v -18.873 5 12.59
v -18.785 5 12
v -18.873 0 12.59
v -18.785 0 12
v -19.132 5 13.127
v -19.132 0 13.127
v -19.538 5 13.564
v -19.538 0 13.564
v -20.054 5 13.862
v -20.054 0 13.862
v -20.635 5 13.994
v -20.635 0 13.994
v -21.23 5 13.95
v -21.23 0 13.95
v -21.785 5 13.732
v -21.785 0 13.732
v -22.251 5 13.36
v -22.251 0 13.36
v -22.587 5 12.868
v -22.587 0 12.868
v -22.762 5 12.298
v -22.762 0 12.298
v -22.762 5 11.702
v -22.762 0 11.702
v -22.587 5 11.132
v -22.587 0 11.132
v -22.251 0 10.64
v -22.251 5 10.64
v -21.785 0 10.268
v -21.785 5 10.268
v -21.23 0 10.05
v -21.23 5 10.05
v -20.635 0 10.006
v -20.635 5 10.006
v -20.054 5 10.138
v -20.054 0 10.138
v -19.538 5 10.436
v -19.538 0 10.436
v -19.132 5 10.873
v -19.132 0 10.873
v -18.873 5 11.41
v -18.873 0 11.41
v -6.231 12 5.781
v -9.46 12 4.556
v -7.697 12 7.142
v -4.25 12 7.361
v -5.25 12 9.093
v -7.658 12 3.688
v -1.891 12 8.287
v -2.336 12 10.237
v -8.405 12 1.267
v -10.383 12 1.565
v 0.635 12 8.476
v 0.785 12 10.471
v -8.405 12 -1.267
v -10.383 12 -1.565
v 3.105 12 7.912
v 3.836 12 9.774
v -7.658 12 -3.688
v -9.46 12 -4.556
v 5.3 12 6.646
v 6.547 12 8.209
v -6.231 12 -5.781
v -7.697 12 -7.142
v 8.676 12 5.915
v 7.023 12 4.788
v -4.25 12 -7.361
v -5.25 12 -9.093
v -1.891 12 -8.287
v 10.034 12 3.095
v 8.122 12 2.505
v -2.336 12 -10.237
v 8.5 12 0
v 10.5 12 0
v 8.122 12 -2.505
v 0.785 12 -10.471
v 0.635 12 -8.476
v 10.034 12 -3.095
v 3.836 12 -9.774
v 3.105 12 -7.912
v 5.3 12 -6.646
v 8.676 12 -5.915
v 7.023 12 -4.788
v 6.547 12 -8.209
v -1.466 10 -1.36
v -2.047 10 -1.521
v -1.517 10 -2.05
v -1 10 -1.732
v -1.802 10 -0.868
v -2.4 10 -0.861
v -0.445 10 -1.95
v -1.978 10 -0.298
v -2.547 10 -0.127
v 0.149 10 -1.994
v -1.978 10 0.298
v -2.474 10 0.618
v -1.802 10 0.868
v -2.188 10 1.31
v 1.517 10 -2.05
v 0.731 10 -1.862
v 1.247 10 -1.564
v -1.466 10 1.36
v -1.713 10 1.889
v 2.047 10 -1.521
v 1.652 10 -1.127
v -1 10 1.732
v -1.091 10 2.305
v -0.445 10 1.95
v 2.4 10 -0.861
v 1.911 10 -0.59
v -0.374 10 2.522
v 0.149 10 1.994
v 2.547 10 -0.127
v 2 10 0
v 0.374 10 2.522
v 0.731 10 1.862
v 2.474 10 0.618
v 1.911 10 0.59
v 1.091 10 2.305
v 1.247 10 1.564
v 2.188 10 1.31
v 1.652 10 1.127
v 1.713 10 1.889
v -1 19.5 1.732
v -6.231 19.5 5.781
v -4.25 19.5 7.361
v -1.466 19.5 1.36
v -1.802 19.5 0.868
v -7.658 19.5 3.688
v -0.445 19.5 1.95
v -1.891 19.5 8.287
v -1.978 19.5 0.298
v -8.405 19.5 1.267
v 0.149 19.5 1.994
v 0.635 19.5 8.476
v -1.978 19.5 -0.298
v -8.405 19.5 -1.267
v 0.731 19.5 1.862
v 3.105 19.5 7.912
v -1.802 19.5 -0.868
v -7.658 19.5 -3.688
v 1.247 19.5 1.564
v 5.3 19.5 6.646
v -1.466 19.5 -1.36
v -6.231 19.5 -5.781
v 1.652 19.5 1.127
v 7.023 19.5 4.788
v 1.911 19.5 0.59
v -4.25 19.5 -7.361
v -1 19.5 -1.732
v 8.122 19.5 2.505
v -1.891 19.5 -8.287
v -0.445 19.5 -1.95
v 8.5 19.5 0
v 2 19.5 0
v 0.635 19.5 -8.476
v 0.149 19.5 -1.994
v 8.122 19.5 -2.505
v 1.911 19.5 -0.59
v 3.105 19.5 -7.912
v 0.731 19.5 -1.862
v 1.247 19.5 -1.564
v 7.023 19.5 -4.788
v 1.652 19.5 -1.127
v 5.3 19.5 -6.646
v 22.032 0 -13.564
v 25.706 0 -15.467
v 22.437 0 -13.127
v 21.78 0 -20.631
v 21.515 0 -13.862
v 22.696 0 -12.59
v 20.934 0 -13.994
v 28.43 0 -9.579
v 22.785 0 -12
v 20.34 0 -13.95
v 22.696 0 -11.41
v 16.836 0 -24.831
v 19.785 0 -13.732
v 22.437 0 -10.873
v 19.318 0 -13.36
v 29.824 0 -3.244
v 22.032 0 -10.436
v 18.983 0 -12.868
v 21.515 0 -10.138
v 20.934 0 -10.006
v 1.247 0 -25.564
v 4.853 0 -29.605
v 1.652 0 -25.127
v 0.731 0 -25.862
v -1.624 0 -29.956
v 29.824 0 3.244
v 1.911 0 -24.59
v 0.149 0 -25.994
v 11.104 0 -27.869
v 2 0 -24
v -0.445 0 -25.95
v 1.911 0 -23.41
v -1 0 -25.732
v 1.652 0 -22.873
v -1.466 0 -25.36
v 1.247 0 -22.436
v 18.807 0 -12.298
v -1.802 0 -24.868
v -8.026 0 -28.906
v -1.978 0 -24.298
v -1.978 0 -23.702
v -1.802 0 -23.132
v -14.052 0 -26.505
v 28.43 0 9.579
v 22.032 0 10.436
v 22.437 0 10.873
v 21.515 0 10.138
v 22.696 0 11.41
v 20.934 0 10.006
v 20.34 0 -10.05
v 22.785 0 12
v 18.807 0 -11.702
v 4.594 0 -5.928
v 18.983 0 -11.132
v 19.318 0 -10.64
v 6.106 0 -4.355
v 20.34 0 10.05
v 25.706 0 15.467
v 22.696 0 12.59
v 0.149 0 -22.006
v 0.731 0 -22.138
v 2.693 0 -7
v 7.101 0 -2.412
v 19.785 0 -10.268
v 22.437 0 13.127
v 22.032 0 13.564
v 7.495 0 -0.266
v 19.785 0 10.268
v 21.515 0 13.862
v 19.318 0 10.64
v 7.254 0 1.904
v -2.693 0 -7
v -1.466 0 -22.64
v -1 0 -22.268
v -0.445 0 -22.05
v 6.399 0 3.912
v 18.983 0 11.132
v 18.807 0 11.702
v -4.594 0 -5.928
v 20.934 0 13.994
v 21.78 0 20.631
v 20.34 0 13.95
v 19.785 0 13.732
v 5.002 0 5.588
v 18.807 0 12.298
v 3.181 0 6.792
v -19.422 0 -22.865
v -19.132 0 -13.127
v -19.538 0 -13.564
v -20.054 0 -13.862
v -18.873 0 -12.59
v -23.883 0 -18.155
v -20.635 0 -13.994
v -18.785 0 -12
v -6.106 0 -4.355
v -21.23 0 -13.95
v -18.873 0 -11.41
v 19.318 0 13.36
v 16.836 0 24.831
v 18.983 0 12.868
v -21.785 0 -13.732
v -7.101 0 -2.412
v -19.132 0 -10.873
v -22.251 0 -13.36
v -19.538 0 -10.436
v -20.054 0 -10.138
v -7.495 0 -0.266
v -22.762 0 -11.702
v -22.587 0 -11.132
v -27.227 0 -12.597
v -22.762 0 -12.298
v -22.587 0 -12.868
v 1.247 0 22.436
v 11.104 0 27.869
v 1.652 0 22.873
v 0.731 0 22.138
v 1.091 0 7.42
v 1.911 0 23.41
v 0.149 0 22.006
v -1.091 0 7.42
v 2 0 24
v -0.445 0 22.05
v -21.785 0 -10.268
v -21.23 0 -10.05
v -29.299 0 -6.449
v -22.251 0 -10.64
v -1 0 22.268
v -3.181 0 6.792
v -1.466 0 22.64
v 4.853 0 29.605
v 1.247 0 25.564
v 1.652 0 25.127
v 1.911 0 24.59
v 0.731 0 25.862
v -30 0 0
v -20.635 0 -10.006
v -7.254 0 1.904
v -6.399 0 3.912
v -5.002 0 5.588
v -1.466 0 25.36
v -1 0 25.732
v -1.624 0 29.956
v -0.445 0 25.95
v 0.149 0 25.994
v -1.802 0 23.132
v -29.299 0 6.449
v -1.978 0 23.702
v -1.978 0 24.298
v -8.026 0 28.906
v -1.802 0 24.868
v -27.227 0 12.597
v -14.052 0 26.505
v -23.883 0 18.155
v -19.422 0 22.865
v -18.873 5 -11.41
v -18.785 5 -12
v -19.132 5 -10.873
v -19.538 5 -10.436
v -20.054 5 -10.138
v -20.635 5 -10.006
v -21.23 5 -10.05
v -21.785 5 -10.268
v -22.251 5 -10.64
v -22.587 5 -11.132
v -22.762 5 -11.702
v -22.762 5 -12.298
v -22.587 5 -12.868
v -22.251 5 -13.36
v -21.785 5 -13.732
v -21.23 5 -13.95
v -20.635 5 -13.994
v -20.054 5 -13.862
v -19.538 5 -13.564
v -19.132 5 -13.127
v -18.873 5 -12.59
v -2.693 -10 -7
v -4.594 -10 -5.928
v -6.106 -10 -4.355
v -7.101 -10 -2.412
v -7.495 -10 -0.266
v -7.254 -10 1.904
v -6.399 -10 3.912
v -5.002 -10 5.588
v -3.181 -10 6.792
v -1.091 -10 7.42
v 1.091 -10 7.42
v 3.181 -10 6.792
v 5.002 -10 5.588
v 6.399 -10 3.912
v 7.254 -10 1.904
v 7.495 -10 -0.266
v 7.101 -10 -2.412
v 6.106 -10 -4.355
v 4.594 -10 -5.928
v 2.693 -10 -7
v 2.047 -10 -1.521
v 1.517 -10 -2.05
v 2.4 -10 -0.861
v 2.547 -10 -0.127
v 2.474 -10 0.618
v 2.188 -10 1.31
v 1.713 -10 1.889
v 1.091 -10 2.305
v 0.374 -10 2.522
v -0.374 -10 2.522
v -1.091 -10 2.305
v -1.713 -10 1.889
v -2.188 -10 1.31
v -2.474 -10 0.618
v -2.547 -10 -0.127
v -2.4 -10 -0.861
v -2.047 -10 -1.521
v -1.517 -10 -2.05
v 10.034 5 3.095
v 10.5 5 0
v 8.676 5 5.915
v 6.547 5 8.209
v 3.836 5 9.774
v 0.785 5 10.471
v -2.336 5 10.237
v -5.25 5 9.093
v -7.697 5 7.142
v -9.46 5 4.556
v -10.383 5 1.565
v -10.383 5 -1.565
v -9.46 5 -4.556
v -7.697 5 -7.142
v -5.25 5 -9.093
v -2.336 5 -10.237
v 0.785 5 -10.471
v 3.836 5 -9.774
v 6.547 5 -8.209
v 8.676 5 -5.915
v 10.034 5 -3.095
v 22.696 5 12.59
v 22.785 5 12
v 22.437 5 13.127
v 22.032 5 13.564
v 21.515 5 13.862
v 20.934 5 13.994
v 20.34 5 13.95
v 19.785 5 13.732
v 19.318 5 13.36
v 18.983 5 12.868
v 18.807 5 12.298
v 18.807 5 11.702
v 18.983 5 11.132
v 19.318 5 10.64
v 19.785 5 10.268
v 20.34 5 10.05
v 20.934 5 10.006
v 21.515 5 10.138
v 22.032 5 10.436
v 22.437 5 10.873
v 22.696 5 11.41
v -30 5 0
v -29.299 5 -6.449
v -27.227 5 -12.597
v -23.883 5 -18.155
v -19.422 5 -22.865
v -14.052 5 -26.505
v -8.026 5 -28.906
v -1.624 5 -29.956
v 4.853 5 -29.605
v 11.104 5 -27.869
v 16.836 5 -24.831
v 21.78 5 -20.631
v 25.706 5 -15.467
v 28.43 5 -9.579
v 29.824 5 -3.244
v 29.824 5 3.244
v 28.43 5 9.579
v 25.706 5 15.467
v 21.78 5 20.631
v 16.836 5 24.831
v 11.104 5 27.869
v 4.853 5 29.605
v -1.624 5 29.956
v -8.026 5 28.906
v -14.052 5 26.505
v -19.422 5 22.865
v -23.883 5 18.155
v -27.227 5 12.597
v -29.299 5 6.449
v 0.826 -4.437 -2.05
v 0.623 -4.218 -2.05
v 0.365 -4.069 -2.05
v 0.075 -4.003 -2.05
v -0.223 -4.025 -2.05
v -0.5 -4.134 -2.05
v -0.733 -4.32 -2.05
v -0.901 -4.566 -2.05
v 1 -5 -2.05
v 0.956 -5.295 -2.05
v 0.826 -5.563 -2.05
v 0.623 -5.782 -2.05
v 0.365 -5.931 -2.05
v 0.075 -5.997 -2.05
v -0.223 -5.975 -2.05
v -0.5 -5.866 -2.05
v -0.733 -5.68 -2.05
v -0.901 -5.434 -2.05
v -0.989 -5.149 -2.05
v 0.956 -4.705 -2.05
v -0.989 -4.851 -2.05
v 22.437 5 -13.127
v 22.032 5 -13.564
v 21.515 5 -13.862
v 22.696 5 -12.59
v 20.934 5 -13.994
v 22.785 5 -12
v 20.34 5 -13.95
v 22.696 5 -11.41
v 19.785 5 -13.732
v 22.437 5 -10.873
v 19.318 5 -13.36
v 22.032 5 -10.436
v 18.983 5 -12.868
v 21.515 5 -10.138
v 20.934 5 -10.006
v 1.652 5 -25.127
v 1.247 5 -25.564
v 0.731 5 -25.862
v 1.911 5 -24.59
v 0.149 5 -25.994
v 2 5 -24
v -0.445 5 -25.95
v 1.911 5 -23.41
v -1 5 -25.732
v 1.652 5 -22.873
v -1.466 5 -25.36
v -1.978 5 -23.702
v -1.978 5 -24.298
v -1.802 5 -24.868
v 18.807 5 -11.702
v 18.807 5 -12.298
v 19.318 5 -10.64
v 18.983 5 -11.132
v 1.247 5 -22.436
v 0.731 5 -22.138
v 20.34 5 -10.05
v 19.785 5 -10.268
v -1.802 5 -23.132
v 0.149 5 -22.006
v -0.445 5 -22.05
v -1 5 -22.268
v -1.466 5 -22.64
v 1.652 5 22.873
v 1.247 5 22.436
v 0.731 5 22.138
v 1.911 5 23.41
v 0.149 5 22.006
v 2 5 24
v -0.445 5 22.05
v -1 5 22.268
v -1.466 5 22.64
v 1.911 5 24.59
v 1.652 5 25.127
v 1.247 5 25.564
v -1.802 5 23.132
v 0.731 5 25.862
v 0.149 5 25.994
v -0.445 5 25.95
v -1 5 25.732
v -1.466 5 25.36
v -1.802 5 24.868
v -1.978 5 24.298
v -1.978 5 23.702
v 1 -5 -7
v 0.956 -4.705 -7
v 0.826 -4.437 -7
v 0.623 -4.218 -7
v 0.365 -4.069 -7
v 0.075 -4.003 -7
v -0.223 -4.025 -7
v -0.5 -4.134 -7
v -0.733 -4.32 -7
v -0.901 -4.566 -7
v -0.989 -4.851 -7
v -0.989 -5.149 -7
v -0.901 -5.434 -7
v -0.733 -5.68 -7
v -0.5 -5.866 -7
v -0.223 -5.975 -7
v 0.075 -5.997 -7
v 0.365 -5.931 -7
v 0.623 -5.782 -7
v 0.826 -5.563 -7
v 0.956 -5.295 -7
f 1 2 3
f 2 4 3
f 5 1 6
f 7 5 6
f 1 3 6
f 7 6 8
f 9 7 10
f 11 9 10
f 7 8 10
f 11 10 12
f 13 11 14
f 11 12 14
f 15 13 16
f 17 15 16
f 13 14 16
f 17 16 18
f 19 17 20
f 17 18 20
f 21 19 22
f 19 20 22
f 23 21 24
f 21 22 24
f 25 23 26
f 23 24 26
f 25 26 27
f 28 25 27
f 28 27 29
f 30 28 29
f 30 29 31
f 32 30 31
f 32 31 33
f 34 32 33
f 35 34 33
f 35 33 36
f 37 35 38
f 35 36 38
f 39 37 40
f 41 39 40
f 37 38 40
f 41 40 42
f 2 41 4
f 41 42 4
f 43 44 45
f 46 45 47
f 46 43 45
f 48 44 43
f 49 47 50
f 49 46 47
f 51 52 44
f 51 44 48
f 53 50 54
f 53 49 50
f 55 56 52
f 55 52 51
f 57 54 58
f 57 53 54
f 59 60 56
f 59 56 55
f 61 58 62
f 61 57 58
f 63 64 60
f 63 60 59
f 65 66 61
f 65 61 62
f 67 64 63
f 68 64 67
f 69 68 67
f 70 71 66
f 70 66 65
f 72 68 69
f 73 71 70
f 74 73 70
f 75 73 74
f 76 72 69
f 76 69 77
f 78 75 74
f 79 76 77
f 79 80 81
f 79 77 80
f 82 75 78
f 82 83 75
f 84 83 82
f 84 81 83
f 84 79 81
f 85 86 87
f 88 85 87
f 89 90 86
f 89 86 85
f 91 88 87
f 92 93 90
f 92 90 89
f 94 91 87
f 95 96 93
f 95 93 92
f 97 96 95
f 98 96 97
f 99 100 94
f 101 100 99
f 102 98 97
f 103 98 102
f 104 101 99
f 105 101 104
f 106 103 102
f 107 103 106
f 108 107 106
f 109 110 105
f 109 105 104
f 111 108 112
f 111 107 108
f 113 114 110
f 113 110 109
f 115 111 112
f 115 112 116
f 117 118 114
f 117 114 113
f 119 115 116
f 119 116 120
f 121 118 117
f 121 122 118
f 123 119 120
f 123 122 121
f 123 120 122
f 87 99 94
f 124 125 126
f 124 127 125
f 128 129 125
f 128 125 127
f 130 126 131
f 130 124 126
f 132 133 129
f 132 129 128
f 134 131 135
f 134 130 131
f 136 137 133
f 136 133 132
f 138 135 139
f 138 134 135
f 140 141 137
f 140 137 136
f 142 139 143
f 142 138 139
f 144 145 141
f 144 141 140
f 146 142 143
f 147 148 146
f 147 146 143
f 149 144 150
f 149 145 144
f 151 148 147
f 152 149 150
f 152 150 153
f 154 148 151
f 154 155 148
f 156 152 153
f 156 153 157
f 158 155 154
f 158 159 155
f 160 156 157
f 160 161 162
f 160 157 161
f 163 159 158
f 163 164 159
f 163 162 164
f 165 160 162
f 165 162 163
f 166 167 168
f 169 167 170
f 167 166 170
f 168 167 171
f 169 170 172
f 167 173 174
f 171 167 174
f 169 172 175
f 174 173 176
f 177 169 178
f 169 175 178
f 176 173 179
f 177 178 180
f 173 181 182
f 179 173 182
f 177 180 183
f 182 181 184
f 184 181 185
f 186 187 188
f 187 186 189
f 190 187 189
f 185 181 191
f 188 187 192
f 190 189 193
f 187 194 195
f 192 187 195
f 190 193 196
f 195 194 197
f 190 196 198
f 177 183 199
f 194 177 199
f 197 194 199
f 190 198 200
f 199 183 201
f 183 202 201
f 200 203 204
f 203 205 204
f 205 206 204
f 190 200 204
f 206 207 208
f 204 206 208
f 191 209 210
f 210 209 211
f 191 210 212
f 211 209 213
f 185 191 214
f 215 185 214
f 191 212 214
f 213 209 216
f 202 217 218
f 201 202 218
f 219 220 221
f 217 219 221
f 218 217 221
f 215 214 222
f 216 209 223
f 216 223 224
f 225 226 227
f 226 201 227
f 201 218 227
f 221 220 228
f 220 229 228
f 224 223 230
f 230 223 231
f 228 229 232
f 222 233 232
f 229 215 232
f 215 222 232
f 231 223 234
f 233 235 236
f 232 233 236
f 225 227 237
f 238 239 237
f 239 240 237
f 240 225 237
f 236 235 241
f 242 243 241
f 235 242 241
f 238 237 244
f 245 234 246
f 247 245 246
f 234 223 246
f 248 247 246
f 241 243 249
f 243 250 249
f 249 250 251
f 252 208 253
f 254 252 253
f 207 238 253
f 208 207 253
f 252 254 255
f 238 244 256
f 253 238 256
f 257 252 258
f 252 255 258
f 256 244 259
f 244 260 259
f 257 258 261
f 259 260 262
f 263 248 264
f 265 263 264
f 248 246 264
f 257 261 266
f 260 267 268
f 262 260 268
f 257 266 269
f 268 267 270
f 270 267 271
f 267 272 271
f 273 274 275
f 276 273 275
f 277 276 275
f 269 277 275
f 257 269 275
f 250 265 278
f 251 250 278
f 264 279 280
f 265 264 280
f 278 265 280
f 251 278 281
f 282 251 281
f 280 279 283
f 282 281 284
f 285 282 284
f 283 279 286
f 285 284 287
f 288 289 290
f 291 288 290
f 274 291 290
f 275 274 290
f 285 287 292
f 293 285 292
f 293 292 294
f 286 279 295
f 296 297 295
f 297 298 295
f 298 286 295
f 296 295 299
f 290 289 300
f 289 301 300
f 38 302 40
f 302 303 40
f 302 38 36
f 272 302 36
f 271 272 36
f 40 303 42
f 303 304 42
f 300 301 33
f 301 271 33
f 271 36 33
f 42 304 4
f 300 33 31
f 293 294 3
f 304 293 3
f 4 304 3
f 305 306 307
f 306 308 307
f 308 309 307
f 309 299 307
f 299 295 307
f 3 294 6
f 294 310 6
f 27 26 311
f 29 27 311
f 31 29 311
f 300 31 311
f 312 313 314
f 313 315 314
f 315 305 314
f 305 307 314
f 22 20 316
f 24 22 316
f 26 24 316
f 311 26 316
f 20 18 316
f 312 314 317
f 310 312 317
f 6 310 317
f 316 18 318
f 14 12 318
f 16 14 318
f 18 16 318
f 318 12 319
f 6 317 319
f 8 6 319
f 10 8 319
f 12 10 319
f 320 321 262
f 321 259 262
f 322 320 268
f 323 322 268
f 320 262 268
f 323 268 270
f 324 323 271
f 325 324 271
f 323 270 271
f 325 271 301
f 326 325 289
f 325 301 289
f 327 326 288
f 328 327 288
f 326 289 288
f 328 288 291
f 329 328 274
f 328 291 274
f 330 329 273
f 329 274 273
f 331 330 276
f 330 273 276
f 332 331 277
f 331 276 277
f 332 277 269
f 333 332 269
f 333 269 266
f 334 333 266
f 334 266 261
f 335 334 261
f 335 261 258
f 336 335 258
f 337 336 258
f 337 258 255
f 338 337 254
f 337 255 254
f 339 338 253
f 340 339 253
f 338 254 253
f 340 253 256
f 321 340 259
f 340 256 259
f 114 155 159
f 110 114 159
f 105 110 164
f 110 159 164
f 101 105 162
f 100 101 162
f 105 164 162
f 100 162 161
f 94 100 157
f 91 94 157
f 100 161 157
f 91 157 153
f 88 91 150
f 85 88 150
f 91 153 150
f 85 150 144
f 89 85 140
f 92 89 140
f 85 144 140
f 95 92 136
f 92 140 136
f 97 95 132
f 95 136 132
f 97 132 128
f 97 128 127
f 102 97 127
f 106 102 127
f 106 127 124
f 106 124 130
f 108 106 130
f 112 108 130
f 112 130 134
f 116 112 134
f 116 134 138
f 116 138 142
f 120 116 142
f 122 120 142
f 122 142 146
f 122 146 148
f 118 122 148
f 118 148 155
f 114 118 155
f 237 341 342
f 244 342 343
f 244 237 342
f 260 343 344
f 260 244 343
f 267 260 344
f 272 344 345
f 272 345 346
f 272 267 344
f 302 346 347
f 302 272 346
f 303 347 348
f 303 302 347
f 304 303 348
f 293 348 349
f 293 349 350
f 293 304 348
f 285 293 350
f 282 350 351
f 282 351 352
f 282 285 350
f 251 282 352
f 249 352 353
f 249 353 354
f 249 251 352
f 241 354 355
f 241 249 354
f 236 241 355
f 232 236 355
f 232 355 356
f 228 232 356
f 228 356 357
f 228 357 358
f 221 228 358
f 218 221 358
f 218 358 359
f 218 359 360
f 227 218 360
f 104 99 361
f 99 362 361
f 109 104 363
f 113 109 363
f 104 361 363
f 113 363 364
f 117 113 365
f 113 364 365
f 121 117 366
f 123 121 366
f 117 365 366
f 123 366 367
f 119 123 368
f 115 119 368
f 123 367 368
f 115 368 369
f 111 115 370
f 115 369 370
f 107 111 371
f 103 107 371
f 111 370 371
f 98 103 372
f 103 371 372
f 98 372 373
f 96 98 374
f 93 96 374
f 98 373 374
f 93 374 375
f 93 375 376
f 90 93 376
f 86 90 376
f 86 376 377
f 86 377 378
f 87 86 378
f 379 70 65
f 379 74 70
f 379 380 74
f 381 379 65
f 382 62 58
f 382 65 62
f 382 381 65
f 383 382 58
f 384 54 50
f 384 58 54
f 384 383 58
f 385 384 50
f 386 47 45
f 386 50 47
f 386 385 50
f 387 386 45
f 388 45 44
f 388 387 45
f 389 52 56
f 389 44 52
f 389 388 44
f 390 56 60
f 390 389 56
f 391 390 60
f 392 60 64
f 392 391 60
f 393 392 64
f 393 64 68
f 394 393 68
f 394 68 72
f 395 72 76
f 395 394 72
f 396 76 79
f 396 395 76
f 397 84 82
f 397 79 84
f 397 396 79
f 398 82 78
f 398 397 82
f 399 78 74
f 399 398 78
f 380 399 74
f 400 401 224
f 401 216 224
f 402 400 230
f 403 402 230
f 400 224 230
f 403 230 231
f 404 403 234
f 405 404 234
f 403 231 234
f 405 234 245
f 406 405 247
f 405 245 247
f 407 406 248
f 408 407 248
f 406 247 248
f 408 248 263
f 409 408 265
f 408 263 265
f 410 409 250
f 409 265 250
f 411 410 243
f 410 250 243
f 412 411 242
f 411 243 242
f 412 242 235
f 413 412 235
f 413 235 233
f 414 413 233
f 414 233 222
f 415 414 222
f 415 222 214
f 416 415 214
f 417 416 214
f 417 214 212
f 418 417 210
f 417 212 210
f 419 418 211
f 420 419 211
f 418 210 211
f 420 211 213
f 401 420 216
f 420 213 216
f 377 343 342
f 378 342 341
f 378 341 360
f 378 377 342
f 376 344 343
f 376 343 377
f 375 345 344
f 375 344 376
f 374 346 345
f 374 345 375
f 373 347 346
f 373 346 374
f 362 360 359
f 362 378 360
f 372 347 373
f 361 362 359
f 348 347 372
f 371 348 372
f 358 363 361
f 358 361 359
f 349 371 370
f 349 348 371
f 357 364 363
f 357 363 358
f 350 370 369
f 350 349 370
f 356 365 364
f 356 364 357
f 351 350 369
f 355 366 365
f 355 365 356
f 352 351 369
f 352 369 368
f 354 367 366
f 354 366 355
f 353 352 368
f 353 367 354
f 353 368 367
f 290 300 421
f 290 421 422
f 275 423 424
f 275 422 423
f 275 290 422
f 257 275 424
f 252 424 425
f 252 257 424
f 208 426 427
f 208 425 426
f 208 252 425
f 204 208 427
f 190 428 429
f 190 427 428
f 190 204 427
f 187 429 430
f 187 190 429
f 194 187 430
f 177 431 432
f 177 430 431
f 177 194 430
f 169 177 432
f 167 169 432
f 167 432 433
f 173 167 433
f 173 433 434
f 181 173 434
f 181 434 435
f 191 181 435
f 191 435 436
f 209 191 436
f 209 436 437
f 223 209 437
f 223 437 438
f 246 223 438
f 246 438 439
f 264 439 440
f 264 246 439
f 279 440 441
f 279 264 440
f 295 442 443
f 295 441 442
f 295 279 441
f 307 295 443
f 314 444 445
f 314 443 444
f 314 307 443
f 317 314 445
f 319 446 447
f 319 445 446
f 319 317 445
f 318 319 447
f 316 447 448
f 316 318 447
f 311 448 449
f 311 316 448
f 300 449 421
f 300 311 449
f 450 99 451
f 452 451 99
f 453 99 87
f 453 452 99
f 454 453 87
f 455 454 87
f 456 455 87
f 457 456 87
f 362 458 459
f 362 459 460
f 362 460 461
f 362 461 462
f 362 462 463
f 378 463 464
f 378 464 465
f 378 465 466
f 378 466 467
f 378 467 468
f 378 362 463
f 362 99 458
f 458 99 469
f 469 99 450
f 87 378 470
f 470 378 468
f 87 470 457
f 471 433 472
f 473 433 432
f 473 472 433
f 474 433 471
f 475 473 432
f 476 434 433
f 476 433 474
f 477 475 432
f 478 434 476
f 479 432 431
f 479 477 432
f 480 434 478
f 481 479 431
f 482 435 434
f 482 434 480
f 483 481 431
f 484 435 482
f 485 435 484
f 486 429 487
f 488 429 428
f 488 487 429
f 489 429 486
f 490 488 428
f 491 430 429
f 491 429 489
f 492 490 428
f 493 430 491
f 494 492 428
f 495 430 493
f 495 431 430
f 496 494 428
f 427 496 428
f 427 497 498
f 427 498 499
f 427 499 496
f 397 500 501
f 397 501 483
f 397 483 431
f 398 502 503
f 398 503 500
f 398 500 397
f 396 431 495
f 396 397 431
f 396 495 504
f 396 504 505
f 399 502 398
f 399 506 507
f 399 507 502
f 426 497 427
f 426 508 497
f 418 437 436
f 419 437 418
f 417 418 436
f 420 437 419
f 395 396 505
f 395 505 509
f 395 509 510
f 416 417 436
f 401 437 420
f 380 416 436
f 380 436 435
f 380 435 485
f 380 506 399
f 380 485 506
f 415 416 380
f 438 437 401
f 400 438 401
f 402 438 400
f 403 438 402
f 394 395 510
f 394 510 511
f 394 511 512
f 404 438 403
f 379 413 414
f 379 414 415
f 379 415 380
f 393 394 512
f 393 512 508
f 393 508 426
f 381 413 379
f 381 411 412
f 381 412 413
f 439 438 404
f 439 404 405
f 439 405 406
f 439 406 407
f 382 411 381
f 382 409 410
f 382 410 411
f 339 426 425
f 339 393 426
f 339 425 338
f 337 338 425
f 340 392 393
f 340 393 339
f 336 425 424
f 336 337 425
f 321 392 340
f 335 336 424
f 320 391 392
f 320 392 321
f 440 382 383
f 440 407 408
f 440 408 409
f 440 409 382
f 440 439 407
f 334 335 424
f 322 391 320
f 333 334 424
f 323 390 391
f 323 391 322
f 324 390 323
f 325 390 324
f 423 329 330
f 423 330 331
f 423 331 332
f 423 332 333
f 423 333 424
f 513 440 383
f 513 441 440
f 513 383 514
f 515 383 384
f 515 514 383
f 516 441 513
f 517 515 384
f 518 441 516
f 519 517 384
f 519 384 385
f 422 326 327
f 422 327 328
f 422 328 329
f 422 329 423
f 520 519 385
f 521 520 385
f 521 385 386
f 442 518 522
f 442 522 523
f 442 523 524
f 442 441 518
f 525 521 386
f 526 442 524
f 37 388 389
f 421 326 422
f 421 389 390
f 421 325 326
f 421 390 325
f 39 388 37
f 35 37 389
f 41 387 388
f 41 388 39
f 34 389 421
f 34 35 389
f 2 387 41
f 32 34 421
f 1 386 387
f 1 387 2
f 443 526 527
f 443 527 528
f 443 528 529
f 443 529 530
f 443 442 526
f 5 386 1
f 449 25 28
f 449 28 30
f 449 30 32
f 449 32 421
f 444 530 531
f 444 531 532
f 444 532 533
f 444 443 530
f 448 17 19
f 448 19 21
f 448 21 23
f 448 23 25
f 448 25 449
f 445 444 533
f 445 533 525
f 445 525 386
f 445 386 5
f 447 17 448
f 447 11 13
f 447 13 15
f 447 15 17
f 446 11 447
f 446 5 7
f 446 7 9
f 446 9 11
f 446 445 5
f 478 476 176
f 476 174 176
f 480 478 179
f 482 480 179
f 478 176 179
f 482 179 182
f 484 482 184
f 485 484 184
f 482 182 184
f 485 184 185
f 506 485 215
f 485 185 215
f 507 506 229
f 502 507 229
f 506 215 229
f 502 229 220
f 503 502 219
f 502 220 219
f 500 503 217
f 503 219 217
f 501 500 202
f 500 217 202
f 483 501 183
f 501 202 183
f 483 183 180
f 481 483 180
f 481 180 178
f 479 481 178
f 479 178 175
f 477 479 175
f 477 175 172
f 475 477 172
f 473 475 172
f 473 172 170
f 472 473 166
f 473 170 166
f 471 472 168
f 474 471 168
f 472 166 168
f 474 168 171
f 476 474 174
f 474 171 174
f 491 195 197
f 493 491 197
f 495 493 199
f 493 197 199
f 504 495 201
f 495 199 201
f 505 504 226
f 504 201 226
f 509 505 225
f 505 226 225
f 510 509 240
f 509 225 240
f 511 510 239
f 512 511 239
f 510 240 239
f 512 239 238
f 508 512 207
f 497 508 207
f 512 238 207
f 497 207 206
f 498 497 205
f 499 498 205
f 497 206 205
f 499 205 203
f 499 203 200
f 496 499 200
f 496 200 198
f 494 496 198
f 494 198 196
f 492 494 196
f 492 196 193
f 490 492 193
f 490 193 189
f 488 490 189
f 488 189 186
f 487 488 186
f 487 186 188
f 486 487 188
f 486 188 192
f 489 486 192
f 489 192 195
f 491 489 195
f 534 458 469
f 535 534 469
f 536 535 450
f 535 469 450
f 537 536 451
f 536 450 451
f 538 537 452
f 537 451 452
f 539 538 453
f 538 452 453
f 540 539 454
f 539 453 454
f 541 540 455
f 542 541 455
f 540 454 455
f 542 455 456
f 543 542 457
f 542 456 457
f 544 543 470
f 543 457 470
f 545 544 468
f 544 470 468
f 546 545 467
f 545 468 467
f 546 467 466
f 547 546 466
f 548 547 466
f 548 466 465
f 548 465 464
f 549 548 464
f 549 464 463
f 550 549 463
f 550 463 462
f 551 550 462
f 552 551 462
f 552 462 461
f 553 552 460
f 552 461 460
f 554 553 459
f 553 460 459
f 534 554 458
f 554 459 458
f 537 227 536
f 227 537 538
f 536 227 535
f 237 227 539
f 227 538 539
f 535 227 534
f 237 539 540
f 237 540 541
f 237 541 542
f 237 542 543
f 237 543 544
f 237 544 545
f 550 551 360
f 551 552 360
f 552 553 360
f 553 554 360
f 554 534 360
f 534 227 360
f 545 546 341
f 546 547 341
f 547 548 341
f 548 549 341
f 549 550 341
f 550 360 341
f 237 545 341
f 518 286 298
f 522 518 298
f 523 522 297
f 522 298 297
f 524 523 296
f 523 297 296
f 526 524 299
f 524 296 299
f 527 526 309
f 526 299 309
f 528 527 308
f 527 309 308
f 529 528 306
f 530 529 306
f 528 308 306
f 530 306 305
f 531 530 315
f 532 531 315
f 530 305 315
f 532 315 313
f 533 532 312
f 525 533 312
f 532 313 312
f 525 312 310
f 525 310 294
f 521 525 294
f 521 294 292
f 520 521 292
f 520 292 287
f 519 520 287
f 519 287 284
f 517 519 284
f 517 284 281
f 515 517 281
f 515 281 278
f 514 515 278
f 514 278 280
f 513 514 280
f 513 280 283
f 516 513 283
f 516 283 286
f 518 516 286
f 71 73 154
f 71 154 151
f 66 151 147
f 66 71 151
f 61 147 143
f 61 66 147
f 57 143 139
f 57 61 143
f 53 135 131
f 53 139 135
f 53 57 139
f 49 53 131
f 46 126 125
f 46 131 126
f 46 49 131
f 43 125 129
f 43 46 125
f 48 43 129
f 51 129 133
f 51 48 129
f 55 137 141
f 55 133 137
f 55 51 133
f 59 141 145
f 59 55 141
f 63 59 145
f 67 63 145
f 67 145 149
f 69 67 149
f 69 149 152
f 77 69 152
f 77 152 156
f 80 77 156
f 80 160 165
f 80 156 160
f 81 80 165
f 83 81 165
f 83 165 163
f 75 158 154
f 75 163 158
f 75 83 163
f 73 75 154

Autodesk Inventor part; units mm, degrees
ref_plane "YZ Plane" through (0, 0, 0) normal (1, 0, 0) x (0, 1, 0)
ref_plane "XZ Plane" through (0, 0, 0) normal (0, 1, 0) x (-1, 0, 0)
ref_plane "XY Plane" through (0, 0, 0) normal (0, 0, 1) x (1, 0, 0)
sketch "Skizze2" plane through (0, 0, 0) normal (0, 1, 0) x (-1, 0, 0)
  circle A0 centre (0, 0) radius 30
  dimension "d3" = 60
extrude "Extrusion2" add sketch "Skizze2" along normal blind 5
sketch "Skizze3" plane through (0, 5, 0) normal (0, 1, 0) x (1, 0, 0)
  circle A0 centre (0, 0) radius 10.5
  dimension "d6" = 21
extrude "Extrusion3" add sketch "Skizze3" along normal blind 7
sketch "Skizze4" plane through (0, 0, 0) normal (0, -1, 0) x (1, 0, 0)
  circle A0 centre (0, 0) radius 7.5
  dimension "d9" = 15
extrude "Extrusion4" add sketch "Skizze4" along normal blind 10
sketch "Skizze5" plane through (0, -10, 0) normal (0, -1, 0) x (1, 0, 0)
  arc A0 (1.5166, -2.05) -> (-1.5166, -2.05) centre (0, 0) ccw
  line L0 (1.5166, -2.05) -> (-1.5166, -2.05)
  dimension "d12" = 5.1
  dimension "d14" = 4.6
extrude "Extrusion5" cut sketch "Skizze5" against normal blind 20
sketch "Skizze6" plane through (-1.5166, -10, -2.05) normal (0, 0, 1) x (1, 0, 0)
  line L0 (-5.9834, 0) -> (9.0166, 0) projected
  line L1 (1.5166, 0) -> (1.5166, 10)
  line L2 (1.5166, 10) -> (1.5166, 0)
  circle A0 centre (1.5166, 5) radius 1
  dimension "d17" = 2
  dimension "d20" = 5
extrude "Extrusion6" cut sketch "Skizze6" against normal blind 20
sketch "Skizze7" plane through (0, -10, 0) normal (0, -1, 0) x (1, 0, 0)
  circle A0 centre (0, 0) radius 7.5 projected
  line L0 (2.6926, -7) -> (-2.6926, -7)
  point P0 (0, -7)
  dimension "d23" = 7
extrude "Extrusion7" cut sketch "Skizze7" against normal blind 10 contours L0 A0 picked at (0.3052, -7.148)
sketch "Skizze8" plane through (0, 0, 0) normal (0, -1, 0) x (1, 0, 0)
  circle A0 centre (0, 0) radius 24 construction
  line L0 (20.7846, 12) -> (20.7846, -12) construction
  line L1 (20.7846, -12) -> (0, -24) construction
  line L2 (0, -24) -> (-20.7846, -12) construction
  line L3 (-20.7846, -12) -> (-20.7846, 12) construction
  line L4 (-20.7846, 12) -> (0, 24) construction
  line L5 (0, 24) -> (20.7846, 12) construction
  circle A1 centre (0, 0) radius 30 projected
  line L6 (30, 0) -> (-30, 0)
  line L7 (0, -30) -> (0, 30)
  circle A2 centre (0, -24) radius 2
  circle A3 centre (20.7846, -12) radius 2
  circle A4 centre (20.7846, 12) radius 2
  circle A5 centre (0, 24) radius 2
  circle A6 centre (-20.7846, 12) radius 2
  circle A7 centre (-20.7846, -12) radius 2
  dimension "d26" = 48
  dimension "d27" = 24
  dimension "d28" = 4
  dimension "d29" = 4
  dimension "d30" = 4
  dimension "d31" = 4
  dimension "d32" = 4
  dimension "d33" = 4
extrude "Extrusion8" cut sketch "Skizze8" against normal blind 20 contours A5 L7 | L7 A5 | A2 L7 | L7 A2 | A3 | A4 | A6 | A7
sketch "Skizze9" plane through (0, 12, 0) normal (0, 1, 0) x (1, 0, 0)
  arc A0 (-1.5166, 2.05) -> (1.5166, 2.05) centre (0, 0) ccw projected
  circle A1 centre (0, 0) radius 8.5
  dimension "d36" = 17
extrude "Extrusion9" add sketch "Skizze9" along normal blind 7.5
sketch "Skizze11" plane through (0, 19.5, 0) normal (0, 1, 0) x (1, 0, 0)
  circle A0 centre (0, 0) radius 2
  dimension "d47" = 4
extrude "Extrusion10" cut sketch "Skizze11" against normal blind 50
properties part number "Radaufhängung_06"
